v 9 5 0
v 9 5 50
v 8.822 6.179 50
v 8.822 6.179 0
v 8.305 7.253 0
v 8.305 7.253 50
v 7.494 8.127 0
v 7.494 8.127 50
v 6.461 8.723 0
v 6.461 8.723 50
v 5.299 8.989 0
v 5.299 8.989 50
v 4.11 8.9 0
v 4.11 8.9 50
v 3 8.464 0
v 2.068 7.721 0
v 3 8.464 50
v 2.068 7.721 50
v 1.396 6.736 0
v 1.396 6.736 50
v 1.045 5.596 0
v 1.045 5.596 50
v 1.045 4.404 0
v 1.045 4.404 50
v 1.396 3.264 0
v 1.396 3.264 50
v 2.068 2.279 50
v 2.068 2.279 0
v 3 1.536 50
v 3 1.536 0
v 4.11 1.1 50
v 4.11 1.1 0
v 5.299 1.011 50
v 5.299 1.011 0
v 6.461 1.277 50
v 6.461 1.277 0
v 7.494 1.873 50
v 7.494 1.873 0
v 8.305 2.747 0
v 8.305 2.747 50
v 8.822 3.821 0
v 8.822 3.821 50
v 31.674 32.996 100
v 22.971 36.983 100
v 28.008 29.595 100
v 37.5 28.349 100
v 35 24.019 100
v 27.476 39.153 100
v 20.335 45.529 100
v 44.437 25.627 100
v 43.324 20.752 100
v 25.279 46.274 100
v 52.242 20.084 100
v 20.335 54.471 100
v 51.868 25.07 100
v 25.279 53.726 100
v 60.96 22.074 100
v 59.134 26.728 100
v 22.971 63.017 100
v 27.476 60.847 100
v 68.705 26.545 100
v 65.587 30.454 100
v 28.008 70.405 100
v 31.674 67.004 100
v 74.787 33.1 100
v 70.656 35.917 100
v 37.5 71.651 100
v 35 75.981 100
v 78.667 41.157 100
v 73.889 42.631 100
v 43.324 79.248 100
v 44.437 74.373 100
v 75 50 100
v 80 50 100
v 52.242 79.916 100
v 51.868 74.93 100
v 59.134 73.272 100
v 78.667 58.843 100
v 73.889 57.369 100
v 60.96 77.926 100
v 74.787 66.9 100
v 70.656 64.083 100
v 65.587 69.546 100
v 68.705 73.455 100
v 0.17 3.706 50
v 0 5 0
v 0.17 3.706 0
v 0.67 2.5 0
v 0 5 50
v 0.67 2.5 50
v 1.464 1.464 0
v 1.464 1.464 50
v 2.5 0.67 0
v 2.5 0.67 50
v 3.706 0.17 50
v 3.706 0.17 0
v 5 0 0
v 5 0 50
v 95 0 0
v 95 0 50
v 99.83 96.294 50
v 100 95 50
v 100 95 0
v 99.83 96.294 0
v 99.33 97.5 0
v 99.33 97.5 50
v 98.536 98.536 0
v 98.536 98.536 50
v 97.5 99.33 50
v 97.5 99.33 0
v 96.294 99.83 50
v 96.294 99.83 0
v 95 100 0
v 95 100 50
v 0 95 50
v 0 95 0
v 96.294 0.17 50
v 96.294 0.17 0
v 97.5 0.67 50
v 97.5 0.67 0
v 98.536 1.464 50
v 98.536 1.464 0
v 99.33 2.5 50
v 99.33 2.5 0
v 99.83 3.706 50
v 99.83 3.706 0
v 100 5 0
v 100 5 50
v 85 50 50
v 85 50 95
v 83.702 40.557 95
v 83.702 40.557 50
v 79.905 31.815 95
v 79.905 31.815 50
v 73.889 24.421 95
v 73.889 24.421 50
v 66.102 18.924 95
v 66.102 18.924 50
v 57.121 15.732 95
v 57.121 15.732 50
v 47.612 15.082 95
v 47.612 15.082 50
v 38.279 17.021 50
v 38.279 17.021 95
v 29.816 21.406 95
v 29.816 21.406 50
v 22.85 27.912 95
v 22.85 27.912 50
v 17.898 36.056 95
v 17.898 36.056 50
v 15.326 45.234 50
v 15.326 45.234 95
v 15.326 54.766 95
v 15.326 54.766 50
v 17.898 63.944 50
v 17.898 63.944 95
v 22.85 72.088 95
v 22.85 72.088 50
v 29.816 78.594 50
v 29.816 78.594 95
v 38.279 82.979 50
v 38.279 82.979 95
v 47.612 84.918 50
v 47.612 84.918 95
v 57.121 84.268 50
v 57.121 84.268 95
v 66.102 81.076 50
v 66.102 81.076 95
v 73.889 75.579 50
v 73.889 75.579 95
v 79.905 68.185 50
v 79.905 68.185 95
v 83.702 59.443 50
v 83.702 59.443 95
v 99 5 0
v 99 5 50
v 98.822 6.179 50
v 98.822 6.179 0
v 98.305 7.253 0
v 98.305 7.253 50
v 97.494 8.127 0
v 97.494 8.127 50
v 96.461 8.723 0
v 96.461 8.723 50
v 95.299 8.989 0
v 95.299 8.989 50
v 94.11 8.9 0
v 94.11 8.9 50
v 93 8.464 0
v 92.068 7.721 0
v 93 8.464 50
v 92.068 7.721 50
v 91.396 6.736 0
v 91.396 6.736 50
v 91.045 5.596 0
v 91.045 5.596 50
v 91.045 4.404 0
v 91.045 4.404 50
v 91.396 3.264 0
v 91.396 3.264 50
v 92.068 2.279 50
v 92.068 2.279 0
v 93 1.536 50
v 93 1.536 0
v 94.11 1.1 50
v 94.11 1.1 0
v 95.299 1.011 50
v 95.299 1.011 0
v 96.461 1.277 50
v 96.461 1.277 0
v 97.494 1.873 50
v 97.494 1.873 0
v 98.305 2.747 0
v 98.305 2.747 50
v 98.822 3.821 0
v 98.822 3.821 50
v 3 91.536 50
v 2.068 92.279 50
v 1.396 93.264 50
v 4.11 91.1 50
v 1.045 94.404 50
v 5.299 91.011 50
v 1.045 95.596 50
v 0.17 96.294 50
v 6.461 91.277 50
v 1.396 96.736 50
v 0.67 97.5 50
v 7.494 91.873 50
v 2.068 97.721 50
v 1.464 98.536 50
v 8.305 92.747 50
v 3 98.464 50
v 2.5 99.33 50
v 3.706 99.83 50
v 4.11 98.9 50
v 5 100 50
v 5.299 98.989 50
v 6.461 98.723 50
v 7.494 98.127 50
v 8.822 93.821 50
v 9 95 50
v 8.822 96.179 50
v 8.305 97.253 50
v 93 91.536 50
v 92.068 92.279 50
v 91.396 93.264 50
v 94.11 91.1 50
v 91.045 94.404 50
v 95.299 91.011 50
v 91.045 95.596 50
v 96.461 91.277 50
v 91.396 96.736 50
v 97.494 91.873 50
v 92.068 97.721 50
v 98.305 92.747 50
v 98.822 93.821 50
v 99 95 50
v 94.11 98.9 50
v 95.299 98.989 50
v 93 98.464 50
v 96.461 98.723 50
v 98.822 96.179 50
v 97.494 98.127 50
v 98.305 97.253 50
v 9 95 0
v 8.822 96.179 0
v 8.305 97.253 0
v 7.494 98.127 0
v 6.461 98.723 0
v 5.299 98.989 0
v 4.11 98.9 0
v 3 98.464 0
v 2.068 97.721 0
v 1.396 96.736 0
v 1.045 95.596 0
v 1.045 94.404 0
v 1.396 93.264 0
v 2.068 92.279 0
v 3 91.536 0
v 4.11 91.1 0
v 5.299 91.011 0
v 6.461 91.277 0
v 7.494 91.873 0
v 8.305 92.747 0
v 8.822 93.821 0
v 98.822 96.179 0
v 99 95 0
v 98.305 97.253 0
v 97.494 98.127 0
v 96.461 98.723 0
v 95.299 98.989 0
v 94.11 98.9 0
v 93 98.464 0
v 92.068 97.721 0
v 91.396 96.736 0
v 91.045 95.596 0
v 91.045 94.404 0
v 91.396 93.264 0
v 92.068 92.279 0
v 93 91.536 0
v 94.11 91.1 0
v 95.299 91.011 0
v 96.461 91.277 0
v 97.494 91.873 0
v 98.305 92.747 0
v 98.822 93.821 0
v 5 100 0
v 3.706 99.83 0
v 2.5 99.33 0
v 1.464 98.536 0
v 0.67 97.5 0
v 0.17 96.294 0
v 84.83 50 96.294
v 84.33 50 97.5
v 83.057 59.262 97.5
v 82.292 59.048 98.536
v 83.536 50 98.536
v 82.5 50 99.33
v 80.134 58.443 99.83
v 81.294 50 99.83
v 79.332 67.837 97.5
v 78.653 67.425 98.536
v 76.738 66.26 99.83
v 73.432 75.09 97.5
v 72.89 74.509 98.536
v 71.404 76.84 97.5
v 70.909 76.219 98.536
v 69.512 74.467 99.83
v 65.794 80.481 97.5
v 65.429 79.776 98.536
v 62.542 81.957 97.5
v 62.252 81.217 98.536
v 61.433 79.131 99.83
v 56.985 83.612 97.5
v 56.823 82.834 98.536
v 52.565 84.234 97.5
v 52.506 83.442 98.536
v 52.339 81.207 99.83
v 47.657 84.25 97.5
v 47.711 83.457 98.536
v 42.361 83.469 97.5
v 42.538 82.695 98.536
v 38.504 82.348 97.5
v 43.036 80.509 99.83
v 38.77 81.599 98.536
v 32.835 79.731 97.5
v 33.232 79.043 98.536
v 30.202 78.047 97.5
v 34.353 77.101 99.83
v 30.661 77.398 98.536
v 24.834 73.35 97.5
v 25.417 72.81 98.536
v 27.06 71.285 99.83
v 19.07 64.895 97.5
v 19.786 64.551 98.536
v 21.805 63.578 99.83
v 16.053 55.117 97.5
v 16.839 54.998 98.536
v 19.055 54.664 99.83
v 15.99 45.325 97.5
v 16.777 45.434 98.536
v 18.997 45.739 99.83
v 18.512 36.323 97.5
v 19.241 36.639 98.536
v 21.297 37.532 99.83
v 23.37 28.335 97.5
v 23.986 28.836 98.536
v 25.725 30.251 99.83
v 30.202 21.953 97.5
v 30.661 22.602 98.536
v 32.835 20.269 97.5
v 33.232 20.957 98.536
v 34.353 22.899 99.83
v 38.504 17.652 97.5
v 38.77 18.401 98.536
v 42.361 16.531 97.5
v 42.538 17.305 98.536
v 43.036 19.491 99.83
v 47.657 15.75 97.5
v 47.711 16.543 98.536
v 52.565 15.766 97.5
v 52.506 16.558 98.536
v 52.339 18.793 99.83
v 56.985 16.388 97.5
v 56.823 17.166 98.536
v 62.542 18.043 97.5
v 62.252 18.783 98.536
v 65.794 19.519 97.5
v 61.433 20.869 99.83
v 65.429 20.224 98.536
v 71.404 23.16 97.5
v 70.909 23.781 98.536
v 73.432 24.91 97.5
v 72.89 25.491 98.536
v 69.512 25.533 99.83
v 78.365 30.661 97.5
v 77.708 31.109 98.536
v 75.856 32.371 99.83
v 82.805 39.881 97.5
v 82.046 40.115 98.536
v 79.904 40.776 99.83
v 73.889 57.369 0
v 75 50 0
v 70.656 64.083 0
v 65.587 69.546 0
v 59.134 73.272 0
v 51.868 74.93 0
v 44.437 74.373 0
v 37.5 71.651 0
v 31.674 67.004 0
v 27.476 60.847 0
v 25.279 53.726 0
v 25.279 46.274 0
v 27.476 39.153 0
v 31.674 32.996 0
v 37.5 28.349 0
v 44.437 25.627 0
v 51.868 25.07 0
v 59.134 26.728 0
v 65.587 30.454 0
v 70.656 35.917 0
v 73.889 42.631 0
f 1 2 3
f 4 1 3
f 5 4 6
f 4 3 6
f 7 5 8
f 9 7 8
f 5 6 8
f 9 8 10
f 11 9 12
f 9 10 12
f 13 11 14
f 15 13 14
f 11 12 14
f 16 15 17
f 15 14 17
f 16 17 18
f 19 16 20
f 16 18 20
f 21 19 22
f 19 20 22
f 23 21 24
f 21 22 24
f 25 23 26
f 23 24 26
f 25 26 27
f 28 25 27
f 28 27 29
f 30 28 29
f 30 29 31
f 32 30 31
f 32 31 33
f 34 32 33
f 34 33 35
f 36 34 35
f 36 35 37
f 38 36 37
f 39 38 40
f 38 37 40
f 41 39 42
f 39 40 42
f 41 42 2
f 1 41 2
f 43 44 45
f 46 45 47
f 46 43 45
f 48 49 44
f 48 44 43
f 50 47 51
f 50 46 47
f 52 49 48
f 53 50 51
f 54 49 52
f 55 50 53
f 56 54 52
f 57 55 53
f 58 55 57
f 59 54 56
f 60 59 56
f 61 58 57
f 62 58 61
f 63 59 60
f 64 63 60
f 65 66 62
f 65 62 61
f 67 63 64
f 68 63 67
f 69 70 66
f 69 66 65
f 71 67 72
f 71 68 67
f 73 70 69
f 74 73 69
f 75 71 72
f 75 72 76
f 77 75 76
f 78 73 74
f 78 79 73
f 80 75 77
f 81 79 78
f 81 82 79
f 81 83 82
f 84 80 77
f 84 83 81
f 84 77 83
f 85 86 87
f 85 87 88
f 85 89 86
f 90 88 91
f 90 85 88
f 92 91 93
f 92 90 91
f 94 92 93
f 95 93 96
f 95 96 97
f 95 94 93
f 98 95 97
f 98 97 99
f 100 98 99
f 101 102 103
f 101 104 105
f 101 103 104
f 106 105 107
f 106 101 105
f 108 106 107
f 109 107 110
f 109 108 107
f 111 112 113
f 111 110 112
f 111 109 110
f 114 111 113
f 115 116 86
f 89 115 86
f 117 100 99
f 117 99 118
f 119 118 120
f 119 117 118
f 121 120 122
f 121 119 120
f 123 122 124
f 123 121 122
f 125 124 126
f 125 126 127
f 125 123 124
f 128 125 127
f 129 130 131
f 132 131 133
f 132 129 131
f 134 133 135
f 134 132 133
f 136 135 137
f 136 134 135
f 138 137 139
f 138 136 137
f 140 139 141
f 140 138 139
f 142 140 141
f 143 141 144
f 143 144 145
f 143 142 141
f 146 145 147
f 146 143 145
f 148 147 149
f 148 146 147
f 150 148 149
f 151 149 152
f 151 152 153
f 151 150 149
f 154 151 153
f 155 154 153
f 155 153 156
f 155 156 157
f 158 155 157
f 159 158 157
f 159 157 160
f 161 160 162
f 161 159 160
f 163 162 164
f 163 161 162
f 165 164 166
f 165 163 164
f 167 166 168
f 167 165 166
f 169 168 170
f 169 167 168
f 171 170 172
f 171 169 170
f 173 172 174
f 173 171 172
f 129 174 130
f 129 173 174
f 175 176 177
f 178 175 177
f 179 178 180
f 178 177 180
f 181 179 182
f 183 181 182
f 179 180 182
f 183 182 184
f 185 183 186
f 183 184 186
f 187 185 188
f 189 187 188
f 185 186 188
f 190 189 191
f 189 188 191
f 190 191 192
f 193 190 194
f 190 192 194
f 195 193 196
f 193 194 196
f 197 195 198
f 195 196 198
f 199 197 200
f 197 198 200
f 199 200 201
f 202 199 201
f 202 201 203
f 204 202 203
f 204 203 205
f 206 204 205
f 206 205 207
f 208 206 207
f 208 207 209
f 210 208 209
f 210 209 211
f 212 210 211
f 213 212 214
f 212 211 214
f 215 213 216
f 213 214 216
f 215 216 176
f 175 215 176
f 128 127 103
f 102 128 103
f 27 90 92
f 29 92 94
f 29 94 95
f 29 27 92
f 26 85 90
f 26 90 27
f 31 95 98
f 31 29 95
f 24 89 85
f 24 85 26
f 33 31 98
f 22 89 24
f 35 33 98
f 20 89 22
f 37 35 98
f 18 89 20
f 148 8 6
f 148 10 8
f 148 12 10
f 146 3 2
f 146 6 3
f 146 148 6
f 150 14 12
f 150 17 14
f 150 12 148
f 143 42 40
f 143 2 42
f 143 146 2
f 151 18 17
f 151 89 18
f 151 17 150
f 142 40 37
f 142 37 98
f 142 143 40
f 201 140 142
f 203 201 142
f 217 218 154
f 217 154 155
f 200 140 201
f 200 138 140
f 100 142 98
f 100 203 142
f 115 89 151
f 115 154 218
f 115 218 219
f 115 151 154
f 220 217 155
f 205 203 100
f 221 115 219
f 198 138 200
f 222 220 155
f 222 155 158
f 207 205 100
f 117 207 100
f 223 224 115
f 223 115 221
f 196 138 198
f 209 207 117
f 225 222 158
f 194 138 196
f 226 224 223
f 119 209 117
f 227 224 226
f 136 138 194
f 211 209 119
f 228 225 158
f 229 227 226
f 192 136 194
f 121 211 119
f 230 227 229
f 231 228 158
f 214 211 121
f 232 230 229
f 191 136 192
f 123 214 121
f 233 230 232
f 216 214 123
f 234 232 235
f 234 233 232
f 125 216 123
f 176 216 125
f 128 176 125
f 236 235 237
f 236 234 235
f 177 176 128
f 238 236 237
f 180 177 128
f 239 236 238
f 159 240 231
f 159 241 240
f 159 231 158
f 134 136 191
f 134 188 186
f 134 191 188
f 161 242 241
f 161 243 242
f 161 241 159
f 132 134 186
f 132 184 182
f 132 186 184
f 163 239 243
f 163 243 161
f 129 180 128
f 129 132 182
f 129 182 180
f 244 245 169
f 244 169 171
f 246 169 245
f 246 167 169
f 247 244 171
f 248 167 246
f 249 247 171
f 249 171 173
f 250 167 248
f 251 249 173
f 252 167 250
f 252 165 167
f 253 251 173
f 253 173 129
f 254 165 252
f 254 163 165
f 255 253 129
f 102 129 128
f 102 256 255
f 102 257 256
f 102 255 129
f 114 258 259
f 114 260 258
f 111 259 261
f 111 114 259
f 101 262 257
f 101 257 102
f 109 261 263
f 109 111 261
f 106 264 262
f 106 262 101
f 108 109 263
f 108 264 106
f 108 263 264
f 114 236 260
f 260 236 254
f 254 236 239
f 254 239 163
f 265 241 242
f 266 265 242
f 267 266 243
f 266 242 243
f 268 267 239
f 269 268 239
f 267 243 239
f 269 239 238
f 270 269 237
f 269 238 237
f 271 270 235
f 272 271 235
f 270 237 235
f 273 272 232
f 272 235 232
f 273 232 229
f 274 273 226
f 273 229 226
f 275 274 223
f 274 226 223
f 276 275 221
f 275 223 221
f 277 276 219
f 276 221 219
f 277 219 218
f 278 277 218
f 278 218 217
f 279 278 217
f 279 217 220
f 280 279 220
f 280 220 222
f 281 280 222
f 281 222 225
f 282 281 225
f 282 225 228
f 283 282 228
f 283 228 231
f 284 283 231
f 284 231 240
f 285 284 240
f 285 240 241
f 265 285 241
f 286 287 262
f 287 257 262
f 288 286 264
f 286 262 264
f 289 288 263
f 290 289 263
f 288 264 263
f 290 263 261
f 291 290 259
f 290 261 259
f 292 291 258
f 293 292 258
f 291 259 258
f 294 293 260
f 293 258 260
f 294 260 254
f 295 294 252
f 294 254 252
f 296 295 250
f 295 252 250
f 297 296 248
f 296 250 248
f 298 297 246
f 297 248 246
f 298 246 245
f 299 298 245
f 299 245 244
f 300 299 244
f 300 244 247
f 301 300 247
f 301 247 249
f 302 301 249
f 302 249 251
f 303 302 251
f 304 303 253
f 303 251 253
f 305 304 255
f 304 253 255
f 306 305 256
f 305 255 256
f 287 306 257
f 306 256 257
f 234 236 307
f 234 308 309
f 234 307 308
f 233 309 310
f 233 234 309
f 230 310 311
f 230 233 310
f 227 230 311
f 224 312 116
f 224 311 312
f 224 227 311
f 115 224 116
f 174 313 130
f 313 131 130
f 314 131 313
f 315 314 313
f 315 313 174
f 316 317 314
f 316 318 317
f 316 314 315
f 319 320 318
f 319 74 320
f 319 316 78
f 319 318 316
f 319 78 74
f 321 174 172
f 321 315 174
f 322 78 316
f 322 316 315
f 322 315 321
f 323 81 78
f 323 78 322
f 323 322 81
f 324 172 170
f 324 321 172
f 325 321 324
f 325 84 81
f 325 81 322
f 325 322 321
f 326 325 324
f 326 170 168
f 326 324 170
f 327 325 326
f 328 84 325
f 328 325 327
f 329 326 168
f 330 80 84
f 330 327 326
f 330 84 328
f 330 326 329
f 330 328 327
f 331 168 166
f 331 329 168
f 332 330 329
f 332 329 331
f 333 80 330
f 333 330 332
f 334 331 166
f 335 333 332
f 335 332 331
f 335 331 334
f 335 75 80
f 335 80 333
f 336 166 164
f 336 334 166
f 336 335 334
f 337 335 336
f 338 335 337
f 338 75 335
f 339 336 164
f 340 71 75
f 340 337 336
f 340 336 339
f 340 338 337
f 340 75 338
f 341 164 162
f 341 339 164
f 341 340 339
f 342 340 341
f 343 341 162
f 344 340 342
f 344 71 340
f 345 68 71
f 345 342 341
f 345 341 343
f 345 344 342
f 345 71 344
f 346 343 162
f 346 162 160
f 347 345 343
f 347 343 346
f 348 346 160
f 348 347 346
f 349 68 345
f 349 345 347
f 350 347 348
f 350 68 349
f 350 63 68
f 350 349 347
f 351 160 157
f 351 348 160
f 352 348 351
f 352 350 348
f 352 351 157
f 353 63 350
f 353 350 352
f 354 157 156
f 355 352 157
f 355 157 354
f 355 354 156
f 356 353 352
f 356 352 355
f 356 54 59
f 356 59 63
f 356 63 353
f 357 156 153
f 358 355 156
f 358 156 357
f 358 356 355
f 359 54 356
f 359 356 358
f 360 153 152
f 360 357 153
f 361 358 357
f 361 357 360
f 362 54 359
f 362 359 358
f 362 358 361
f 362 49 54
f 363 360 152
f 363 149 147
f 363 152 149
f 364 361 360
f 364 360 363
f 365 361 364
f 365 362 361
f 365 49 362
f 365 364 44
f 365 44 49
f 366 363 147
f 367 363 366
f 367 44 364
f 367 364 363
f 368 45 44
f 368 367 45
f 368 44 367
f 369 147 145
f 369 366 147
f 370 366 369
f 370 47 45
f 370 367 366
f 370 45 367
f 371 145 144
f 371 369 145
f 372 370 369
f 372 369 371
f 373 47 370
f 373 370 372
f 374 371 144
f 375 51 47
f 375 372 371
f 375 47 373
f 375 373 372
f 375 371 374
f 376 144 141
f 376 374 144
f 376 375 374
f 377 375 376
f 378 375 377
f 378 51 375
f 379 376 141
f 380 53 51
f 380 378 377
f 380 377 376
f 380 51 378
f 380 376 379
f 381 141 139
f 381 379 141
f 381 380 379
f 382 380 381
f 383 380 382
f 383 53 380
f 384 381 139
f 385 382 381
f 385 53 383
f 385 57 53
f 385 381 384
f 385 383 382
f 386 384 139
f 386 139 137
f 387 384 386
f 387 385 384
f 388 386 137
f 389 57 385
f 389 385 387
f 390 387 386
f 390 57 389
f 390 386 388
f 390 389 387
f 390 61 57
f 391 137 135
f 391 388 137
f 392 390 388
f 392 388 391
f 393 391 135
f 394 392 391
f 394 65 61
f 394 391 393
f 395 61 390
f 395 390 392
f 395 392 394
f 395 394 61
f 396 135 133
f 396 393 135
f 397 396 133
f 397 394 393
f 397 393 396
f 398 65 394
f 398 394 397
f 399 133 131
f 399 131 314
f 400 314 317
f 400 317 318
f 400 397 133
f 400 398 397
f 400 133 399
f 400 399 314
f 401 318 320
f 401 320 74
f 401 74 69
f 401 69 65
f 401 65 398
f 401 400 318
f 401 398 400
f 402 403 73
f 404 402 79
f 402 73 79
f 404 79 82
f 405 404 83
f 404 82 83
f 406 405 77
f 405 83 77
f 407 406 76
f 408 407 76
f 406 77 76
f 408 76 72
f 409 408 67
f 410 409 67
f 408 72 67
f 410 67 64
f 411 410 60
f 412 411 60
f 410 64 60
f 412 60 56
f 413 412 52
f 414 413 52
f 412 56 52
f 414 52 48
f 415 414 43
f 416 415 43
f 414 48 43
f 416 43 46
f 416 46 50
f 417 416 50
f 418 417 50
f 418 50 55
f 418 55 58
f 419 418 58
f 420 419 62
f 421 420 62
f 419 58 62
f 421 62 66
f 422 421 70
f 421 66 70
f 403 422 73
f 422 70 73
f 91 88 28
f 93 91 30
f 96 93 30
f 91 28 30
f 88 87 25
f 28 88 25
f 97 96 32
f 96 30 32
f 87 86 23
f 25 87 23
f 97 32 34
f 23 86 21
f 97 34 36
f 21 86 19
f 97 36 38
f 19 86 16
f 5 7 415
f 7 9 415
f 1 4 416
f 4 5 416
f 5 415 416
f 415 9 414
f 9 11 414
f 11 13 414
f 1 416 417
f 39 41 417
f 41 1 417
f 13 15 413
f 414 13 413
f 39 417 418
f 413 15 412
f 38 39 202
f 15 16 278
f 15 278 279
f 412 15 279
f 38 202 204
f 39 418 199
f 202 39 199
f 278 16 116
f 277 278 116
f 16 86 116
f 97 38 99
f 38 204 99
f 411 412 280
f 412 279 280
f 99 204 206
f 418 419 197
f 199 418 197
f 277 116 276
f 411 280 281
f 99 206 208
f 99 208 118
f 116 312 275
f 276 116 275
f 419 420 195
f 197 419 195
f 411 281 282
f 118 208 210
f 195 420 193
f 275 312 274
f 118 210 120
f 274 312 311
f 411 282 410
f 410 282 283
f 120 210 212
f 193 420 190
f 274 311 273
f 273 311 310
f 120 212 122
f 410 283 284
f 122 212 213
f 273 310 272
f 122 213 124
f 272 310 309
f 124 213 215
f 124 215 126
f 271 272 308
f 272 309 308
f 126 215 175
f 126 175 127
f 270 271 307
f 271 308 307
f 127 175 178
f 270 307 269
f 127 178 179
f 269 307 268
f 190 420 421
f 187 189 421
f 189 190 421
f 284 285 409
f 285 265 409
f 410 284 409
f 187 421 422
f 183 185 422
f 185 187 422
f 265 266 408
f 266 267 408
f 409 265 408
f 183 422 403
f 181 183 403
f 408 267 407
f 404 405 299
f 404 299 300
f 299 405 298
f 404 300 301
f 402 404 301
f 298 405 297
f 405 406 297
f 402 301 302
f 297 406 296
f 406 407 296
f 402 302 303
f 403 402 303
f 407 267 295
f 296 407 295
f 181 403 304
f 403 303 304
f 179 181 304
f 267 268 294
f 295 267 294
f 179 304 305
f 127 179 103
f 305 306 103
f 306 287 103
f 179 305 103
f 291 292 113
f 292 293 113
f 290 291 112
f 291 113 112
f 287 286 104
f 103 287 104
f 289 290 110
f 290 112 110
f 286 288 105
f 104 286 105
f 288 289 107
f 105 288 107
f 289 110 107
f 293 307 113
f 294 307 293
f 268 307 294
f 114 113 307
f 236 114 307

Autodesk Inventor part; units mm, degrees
ref_plane "YZ Plane" through (0, 0, 0) normal (1, 0, 0) x (0, 1, 0)
ref_plane "XZ Plane" through (0, 0, 0) normal (0, 1, 0) x (-1, 0, 0)
ref_plane "XY Plane" through (0, 0, 0) normal (0, 0, 1) x (1, 0, 0)
sketch "Sketch1" plane through (0, 0, 0) normal (0, 0, 1) x (1, 0, 0)
  line L0 (0, 0) -> (100, 0)
  line L1 (100, 0) -> (100, 100)
  line L2 (100, 100) -> (0, 100)
  line L3 (0, 100) -> (0, 0)
  dimension "d0" = 100
  dimension "d1" = 100
extrude "Extrusion1" add sketch "Sketch1" along normal blind 50
sketch "Sketch2" plane through (0, 0, 50) normal (0, 0, 1) x (1, 0, 0)
  line L0 (100, 100) -> (0, 100) projected
  line L1 (50, 100) -> (50, 0)
  line L2 (0, 100) -> (0, 0) projected
  line L3 (0, 50) -> (100, 50)
  circle A0 centre (50, 50) radius 35
  dimension "d4" = 70
extrude "Extrusion2" add sketch "Sketch2" along normal blind 50 contours A0 L3 L1 | L1 L3 A0 | L3 A0 L1 | L1 A0 L3
fillet "Fillet1" radius 5 4 edges at (100, 100, 25) (0, 100, 25) (0, 0, 25) (100, 0, 25)
sketch "Sketch3" plane through (50, 50, 100) normal (0, 0, 1) x (1, 0, 0)
  circle A0 centre (0, 0) radius 25
  point P0 (-50, -50)
  dimension "d8" = 50
extrude "Extrusion3" cut sketch "Sketch3" against normal blind 100
fillet "Fillet2" radius 5 1 edges at (15, 50, 100)
sketch "Sketch4" plane through (0, 0, 50) normal (0, 0, 1) x (1, 0, 0)
  arc A0 (0, 5) -> (5, 0) centre (5, 5) ccw construction
  circle A1 centre (5, 5) radius 4
  arc A2 (95, 0) -> (100, 5) centre (95, 5) ccw projected
  circle A3 centre (95, 5) radius 4
  arc A4 (100, 95) -> (95, 100) centre (95, 95) ccw projected
  circle A5 centre (95, 95) radius 4
  arc A6 (5, 100) -> (0, 95) centre (5, 95) ccw projected
  circle A7 centre (5, 95) radius 4
  point P0 (0, 0)
extrude "Extrusion4" cut sketch "Sketch4" against normal blind 100
thread "Thread1" size "M50x4" class "6H" standard "ANSI Metric M Profile" full length
properties part number "Tarea1"
